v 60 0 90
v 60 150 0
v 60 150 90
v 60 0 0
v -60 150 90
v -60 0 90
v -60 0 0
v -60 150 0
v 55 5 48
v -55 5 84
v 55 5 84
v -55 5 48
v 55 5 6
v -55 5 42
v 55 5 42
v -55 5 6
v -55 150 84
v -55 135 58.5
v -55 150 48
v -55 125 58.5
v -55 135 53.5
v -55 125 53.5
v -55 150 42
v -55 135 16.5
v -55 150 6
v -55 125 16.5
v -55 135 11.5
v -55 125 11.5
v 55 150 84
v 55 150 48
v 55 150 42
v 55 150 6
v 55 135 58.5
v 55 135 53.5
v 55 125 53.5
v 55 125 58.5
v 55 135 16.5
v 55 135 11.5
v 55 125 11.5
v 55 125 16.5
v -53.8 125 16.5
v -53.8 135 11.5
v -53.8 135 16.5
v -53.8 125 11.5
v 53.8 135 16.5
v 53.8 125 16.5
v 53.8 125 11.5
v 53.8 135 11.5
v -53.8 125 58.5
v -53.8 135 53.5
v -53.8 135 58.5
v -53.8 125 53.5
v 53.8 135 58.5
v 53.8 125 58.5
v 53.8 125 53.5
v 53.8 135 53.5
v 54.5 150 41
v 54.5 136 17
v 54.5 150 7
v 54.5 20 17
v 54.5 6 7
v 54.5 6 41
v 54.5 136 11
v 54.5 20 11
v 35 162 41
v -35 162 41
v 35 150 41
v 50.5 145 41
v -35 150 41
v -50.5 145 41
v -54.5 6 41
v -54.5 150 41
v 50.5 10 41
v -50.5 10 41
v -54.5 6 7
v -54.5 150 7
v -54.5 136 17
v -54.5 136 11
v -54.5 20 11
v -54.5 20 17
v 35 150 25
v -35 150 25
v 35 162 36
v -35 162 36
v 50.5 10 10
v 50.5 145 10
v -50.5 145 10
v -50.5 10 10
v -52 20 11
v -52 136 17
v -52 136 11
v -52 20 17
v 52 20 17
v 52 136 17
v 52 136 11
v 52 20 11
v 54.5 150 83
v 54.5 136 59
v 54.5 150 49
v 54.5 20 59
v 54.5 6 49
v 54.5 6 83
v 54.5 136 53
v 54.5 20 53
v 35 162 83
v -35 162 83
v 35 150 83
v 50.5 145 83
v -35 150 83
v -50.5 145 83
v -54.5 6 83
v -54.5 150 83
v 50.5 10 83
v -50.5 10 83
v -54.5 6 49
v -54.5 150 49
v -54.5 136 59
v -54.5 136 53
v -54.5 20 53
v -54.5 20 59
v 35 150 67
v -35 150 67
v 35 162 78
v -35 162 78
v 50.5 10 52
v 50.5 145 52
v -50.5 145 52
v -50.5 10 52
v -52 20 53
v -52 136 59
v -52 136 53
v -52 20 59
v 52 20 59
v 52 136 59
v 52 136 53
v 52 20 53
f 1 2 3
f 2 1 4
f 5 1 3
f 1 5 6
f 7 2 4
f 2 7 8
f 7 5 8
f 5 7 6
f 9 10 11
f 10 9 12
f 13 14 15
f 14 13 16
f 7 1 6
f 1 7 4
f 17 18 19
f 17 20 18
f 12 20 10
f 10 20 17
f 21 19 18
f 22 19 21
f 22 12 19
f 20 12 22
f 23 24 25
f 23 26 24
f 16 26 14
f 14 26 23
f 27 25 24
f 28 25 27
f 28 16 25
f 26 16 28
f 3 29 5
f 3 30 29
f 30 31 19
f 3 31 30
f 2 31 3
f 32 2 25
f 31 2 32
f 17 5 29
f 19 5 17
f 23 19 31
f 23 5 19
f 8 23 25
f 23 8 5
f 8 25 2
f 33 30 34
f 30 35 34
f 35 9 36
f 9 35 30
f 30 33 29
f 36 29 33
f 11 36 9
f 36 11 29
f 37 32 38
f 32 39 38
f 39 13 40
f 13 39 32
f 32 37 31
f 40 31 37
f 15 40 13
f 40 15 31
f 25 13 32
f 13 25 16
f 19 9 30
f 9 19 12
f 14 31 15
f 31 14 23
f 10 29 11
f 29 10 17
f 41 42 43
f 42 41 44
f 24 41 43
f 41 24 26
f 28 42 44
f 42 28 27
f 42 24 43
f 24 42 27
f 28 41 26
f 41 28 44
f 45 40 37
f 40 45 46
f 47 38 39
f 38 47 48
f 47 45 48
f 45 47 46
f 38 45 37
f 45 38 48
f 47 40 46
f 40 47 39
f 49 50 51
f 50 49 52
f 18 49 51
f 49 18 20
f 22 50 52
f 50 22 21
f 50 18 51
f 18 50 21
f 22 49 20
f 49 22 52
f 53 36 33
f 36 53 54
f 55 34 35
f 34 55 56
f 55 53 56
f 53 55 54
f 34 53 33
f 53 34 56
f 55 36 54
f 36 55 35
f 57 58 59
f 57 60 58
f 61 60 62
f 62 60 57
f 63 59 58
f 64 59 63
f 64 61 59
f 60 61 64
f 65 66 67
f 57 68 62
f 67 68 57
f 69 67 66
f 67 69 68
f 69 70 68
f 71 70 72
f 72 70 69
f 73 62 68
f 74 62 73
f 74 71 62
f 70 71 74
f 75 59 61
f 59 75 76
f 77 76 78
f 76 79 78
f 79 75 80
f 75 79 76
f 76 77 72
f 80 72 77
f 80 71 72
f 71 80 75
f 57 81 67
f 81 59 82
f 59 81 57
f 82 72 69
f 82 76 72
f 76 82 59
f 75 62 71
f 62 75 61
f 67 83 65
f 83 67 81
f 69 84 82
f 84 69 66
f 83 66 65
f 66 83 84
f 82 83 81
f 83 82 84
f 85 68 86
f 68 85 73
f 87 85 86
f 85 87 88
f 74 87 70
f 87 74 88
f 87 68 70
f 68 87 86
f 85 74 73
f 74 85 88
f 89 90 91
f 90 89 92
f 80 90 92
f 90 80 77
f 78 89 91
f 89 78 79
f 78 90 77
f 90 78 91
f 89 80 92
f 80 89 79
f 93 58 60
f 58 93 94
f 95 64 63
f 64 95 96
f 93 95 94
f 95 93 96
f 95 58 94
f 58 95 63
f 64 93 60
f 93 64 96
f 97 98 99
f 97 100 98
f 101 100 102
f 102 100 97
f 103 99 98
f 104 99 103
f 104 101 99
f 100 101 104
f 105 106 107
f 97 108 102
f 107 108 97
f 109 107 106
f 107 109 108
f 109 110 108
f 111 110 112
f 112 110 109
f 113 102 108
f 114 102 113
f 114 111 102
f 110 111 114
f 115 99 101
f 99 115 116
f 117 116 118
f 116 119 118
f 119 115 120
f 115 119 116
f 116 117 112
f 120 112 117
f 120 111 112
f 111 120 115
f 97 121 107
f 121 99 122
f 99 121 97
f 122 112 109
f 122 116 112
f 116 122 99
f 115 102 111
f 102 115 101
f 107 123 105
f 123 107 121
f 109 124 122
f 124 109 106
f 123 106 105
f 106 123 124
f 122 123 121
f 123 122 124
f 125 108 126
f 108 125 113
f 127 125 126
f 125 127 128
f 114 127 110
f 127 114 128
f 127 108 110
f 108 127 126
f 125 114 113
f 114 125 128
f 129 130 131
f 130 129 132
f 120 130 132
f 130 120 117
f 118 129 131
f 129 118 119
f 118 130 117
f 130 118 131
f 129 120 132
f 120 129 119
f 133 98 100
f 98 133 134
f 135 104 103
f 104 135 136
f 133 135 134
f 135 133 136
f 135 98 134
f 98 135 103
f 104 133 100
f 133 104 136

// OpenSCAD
part = "assembly"; // [assembly:Assembly, frame:Frame, drawer:Drawer]
cadverify_only = "";
module instance(name, part, unit = 1) {
    echo(cadverify_instance = [name, part, unit]);
    if (cadverify_only == "" || cadverify_only == name) children();
}
// frame assembly coords: X -60..60, Y 0..150, Z 0..90
module frame_asm() {
    union() {
        translate([-60,0,0]) cube([120,5,90]);
        translate([-60,0,0]) cube([5,150,90]);
        translate([55,0,0]) cube([5,150,90]);
        translate([-55,5,0]) cube([110,145,6]);
        translate([-55,5,42]) cube([110,145,6]);
        translate([-55,5,84]) cube([110,145,6]);
        translate([-55,125,11.5]) cube([1.2,10,5]);
        translate([53.8,125,11.5]) cube([1.2,10,5]);
        translate([-55,125,53.5]) cube([1.2,10,5]);
        translate([53.8,125,53.5]) cube([1.2,10,5]);
    }
}
module frame_print() {
    translate([0,90,0]) rotate([90,0,0]) frame_asm();
}
// drawer part coords: X -54.5..54.5, Y 0..144 body + handle to 156, Z 0..34
module drawer_raw() {
    difference() {
        union() {
            translate([-54.5,0,0]) cube([109,144,34]);
            // handle wedge (solid triangular prism via hull) + tip block, overlapped for manifold union
            hull() {
                translate([-35,143,18]) cube([70,1,1]);
                translate([-35,143,29]) cube([70,1,1]);
                translate([-35,155,29]) cube([70,1,1]);
            }
            translate([-35,143,29]) cube([70,13,5]);
        }
        translate([-50.5,4,3]) cube([101,135,32]);
        translate([-54.5,14,4]) cube([2.5,116,6]);
        translate([52,14,4]) cube([2.5,116,6]);
    }
}
module drawer_part() { drawer_raw(); }
module frame_spec() {
    echo(cadverify_spec = [
        ["bounds", [[-60,0,0],[60,90,150]]],
        ["bodies", 1],
        ["through_holes", 0],
        ["support_faces", [["bed","-z",5000]]],
        ["overhangs_allowed", [
            ["stop tab underside, bridge 1.2mm", [[-55,73,124],[-53.8,79,126]]],
            ["stop tab underside, bridge 1.2mm", [[53.8,73,124],[55,79,126]]],
            ["stop tab underside, bridge 1.2mm", [[-55,31,124],[-53.8,37,126]]],
            ["stop tab underside, bridge 1.2mm", [[53.8,31,124],[55,37,126]]]
        ]],
        ["copies", 1],
        ["details", [
            ["back_panel","material",[[-60,0,0],[60,90,5]],0.9],
            ["stop_tab_ll","material",[[-55,73,125],[-53.8,79,135]],0.9],
            ["stop_tab_lr","material",[[53.8,73,125],[55,79,135]],0.9],
            ["stop_tab_ul","material",[[-55,31,125],[-53.8,37,135]],0.9],
            ["stop_tab_ur","material",[[53.8,31,125],[55,37,135]],0.9],
            ["lower_cavity","void",[[-55,48,5],[55,84,150]],0.9],
            ["upper_cavity","void",[[-55,6,5],[55,42,150]],0.9],
            ["back","thickness",[0,10,-1],[0,0,1],5]
        ]]
    ]);
}
module drawer_spec() {
    echo(cadverify_spec = [
        ["bounds", [[-54.5,0,0],[54.5,156,34]]],
        ["bodies", 1],
        ["through_holes", 0],
        ["support_faces", [["bed","-z",10000]]],
        ["overhangs_allowed", [
            ["drawer slide groove ceiling, bridge 5mm", [[-54.5,14,9],[-52,130,11]]],
            ["drawer slide groove ceiling, bridge 5mm", [[52,14,9],[54.5,130,11]]]
        ]],
        ["copies", 2],
        ["details", [
            ["pull_tip","material",[[-35,150,30],[35,156,34]],0.9],
            ["groove_left","void",[[-54.5,14,4],[-52,130,10]],0.9],
            ["groove_right","void",[[52,14,4],[54.5,130,10]],0.9],
            ["drawer_cavity","void",[[-50.5,4,3],[50.5,139,34]],0.9],
            ["bottom","thickness",[0,70,-1],[0,0,1],3],
            ["side_walls","thickness",[-55.5,70,20],[1,0,0],4],
            ["pull_shape","view",[[-35,144,18],[35,156,34]]]
        ]]
    ]);
}
module assembly_spec() {
    echo(cadverify_spec = [
        ["bounds", [[-60,0,0],[60,162,90]]],
        ["support_faces", [["base","-z",5000]]],
        ["allowed_interferences", []],
        ["motions", [
            ["drawer_lower_slide", ["drawer_lower"], "slide", [0,1,0], [0,105], ["stops", [0,105]]],
            ["drawer_upper_slide", ["drawer_upper"], "slide", [0,1,0], [0,105], ["stops", [0,105]]]
        ]],
        ["assembly_order", [
            [["frame"], [0,0,0]],
            [["drawer_lower"], [0,-1,0], ["flex", [["drawer_lower","frame",0.7,"stop tabs snap into grooves"]]]],
            [["drawer_upper"], [0,-1,0], ["flex", [["drawer_upper","frame",0.7,"stop tabs snap into grooves"]]]]
        ]]
    ]);
}
if (part == "frame") { frame_spec(); frame_print(); }
else if (part == "drawer") { drawer_spec(); drawer_part(); }
else if (part == "assembly") {
    assembly_spec();
    instance("frame","frame",1) frame_asm();
    instance("drawer_lower","drawer",1) translate([0,6,7]) drawer_raw();
    instance("drawer_upper","drawer",1) translate([0,6,49]) drawer_raw();
}
